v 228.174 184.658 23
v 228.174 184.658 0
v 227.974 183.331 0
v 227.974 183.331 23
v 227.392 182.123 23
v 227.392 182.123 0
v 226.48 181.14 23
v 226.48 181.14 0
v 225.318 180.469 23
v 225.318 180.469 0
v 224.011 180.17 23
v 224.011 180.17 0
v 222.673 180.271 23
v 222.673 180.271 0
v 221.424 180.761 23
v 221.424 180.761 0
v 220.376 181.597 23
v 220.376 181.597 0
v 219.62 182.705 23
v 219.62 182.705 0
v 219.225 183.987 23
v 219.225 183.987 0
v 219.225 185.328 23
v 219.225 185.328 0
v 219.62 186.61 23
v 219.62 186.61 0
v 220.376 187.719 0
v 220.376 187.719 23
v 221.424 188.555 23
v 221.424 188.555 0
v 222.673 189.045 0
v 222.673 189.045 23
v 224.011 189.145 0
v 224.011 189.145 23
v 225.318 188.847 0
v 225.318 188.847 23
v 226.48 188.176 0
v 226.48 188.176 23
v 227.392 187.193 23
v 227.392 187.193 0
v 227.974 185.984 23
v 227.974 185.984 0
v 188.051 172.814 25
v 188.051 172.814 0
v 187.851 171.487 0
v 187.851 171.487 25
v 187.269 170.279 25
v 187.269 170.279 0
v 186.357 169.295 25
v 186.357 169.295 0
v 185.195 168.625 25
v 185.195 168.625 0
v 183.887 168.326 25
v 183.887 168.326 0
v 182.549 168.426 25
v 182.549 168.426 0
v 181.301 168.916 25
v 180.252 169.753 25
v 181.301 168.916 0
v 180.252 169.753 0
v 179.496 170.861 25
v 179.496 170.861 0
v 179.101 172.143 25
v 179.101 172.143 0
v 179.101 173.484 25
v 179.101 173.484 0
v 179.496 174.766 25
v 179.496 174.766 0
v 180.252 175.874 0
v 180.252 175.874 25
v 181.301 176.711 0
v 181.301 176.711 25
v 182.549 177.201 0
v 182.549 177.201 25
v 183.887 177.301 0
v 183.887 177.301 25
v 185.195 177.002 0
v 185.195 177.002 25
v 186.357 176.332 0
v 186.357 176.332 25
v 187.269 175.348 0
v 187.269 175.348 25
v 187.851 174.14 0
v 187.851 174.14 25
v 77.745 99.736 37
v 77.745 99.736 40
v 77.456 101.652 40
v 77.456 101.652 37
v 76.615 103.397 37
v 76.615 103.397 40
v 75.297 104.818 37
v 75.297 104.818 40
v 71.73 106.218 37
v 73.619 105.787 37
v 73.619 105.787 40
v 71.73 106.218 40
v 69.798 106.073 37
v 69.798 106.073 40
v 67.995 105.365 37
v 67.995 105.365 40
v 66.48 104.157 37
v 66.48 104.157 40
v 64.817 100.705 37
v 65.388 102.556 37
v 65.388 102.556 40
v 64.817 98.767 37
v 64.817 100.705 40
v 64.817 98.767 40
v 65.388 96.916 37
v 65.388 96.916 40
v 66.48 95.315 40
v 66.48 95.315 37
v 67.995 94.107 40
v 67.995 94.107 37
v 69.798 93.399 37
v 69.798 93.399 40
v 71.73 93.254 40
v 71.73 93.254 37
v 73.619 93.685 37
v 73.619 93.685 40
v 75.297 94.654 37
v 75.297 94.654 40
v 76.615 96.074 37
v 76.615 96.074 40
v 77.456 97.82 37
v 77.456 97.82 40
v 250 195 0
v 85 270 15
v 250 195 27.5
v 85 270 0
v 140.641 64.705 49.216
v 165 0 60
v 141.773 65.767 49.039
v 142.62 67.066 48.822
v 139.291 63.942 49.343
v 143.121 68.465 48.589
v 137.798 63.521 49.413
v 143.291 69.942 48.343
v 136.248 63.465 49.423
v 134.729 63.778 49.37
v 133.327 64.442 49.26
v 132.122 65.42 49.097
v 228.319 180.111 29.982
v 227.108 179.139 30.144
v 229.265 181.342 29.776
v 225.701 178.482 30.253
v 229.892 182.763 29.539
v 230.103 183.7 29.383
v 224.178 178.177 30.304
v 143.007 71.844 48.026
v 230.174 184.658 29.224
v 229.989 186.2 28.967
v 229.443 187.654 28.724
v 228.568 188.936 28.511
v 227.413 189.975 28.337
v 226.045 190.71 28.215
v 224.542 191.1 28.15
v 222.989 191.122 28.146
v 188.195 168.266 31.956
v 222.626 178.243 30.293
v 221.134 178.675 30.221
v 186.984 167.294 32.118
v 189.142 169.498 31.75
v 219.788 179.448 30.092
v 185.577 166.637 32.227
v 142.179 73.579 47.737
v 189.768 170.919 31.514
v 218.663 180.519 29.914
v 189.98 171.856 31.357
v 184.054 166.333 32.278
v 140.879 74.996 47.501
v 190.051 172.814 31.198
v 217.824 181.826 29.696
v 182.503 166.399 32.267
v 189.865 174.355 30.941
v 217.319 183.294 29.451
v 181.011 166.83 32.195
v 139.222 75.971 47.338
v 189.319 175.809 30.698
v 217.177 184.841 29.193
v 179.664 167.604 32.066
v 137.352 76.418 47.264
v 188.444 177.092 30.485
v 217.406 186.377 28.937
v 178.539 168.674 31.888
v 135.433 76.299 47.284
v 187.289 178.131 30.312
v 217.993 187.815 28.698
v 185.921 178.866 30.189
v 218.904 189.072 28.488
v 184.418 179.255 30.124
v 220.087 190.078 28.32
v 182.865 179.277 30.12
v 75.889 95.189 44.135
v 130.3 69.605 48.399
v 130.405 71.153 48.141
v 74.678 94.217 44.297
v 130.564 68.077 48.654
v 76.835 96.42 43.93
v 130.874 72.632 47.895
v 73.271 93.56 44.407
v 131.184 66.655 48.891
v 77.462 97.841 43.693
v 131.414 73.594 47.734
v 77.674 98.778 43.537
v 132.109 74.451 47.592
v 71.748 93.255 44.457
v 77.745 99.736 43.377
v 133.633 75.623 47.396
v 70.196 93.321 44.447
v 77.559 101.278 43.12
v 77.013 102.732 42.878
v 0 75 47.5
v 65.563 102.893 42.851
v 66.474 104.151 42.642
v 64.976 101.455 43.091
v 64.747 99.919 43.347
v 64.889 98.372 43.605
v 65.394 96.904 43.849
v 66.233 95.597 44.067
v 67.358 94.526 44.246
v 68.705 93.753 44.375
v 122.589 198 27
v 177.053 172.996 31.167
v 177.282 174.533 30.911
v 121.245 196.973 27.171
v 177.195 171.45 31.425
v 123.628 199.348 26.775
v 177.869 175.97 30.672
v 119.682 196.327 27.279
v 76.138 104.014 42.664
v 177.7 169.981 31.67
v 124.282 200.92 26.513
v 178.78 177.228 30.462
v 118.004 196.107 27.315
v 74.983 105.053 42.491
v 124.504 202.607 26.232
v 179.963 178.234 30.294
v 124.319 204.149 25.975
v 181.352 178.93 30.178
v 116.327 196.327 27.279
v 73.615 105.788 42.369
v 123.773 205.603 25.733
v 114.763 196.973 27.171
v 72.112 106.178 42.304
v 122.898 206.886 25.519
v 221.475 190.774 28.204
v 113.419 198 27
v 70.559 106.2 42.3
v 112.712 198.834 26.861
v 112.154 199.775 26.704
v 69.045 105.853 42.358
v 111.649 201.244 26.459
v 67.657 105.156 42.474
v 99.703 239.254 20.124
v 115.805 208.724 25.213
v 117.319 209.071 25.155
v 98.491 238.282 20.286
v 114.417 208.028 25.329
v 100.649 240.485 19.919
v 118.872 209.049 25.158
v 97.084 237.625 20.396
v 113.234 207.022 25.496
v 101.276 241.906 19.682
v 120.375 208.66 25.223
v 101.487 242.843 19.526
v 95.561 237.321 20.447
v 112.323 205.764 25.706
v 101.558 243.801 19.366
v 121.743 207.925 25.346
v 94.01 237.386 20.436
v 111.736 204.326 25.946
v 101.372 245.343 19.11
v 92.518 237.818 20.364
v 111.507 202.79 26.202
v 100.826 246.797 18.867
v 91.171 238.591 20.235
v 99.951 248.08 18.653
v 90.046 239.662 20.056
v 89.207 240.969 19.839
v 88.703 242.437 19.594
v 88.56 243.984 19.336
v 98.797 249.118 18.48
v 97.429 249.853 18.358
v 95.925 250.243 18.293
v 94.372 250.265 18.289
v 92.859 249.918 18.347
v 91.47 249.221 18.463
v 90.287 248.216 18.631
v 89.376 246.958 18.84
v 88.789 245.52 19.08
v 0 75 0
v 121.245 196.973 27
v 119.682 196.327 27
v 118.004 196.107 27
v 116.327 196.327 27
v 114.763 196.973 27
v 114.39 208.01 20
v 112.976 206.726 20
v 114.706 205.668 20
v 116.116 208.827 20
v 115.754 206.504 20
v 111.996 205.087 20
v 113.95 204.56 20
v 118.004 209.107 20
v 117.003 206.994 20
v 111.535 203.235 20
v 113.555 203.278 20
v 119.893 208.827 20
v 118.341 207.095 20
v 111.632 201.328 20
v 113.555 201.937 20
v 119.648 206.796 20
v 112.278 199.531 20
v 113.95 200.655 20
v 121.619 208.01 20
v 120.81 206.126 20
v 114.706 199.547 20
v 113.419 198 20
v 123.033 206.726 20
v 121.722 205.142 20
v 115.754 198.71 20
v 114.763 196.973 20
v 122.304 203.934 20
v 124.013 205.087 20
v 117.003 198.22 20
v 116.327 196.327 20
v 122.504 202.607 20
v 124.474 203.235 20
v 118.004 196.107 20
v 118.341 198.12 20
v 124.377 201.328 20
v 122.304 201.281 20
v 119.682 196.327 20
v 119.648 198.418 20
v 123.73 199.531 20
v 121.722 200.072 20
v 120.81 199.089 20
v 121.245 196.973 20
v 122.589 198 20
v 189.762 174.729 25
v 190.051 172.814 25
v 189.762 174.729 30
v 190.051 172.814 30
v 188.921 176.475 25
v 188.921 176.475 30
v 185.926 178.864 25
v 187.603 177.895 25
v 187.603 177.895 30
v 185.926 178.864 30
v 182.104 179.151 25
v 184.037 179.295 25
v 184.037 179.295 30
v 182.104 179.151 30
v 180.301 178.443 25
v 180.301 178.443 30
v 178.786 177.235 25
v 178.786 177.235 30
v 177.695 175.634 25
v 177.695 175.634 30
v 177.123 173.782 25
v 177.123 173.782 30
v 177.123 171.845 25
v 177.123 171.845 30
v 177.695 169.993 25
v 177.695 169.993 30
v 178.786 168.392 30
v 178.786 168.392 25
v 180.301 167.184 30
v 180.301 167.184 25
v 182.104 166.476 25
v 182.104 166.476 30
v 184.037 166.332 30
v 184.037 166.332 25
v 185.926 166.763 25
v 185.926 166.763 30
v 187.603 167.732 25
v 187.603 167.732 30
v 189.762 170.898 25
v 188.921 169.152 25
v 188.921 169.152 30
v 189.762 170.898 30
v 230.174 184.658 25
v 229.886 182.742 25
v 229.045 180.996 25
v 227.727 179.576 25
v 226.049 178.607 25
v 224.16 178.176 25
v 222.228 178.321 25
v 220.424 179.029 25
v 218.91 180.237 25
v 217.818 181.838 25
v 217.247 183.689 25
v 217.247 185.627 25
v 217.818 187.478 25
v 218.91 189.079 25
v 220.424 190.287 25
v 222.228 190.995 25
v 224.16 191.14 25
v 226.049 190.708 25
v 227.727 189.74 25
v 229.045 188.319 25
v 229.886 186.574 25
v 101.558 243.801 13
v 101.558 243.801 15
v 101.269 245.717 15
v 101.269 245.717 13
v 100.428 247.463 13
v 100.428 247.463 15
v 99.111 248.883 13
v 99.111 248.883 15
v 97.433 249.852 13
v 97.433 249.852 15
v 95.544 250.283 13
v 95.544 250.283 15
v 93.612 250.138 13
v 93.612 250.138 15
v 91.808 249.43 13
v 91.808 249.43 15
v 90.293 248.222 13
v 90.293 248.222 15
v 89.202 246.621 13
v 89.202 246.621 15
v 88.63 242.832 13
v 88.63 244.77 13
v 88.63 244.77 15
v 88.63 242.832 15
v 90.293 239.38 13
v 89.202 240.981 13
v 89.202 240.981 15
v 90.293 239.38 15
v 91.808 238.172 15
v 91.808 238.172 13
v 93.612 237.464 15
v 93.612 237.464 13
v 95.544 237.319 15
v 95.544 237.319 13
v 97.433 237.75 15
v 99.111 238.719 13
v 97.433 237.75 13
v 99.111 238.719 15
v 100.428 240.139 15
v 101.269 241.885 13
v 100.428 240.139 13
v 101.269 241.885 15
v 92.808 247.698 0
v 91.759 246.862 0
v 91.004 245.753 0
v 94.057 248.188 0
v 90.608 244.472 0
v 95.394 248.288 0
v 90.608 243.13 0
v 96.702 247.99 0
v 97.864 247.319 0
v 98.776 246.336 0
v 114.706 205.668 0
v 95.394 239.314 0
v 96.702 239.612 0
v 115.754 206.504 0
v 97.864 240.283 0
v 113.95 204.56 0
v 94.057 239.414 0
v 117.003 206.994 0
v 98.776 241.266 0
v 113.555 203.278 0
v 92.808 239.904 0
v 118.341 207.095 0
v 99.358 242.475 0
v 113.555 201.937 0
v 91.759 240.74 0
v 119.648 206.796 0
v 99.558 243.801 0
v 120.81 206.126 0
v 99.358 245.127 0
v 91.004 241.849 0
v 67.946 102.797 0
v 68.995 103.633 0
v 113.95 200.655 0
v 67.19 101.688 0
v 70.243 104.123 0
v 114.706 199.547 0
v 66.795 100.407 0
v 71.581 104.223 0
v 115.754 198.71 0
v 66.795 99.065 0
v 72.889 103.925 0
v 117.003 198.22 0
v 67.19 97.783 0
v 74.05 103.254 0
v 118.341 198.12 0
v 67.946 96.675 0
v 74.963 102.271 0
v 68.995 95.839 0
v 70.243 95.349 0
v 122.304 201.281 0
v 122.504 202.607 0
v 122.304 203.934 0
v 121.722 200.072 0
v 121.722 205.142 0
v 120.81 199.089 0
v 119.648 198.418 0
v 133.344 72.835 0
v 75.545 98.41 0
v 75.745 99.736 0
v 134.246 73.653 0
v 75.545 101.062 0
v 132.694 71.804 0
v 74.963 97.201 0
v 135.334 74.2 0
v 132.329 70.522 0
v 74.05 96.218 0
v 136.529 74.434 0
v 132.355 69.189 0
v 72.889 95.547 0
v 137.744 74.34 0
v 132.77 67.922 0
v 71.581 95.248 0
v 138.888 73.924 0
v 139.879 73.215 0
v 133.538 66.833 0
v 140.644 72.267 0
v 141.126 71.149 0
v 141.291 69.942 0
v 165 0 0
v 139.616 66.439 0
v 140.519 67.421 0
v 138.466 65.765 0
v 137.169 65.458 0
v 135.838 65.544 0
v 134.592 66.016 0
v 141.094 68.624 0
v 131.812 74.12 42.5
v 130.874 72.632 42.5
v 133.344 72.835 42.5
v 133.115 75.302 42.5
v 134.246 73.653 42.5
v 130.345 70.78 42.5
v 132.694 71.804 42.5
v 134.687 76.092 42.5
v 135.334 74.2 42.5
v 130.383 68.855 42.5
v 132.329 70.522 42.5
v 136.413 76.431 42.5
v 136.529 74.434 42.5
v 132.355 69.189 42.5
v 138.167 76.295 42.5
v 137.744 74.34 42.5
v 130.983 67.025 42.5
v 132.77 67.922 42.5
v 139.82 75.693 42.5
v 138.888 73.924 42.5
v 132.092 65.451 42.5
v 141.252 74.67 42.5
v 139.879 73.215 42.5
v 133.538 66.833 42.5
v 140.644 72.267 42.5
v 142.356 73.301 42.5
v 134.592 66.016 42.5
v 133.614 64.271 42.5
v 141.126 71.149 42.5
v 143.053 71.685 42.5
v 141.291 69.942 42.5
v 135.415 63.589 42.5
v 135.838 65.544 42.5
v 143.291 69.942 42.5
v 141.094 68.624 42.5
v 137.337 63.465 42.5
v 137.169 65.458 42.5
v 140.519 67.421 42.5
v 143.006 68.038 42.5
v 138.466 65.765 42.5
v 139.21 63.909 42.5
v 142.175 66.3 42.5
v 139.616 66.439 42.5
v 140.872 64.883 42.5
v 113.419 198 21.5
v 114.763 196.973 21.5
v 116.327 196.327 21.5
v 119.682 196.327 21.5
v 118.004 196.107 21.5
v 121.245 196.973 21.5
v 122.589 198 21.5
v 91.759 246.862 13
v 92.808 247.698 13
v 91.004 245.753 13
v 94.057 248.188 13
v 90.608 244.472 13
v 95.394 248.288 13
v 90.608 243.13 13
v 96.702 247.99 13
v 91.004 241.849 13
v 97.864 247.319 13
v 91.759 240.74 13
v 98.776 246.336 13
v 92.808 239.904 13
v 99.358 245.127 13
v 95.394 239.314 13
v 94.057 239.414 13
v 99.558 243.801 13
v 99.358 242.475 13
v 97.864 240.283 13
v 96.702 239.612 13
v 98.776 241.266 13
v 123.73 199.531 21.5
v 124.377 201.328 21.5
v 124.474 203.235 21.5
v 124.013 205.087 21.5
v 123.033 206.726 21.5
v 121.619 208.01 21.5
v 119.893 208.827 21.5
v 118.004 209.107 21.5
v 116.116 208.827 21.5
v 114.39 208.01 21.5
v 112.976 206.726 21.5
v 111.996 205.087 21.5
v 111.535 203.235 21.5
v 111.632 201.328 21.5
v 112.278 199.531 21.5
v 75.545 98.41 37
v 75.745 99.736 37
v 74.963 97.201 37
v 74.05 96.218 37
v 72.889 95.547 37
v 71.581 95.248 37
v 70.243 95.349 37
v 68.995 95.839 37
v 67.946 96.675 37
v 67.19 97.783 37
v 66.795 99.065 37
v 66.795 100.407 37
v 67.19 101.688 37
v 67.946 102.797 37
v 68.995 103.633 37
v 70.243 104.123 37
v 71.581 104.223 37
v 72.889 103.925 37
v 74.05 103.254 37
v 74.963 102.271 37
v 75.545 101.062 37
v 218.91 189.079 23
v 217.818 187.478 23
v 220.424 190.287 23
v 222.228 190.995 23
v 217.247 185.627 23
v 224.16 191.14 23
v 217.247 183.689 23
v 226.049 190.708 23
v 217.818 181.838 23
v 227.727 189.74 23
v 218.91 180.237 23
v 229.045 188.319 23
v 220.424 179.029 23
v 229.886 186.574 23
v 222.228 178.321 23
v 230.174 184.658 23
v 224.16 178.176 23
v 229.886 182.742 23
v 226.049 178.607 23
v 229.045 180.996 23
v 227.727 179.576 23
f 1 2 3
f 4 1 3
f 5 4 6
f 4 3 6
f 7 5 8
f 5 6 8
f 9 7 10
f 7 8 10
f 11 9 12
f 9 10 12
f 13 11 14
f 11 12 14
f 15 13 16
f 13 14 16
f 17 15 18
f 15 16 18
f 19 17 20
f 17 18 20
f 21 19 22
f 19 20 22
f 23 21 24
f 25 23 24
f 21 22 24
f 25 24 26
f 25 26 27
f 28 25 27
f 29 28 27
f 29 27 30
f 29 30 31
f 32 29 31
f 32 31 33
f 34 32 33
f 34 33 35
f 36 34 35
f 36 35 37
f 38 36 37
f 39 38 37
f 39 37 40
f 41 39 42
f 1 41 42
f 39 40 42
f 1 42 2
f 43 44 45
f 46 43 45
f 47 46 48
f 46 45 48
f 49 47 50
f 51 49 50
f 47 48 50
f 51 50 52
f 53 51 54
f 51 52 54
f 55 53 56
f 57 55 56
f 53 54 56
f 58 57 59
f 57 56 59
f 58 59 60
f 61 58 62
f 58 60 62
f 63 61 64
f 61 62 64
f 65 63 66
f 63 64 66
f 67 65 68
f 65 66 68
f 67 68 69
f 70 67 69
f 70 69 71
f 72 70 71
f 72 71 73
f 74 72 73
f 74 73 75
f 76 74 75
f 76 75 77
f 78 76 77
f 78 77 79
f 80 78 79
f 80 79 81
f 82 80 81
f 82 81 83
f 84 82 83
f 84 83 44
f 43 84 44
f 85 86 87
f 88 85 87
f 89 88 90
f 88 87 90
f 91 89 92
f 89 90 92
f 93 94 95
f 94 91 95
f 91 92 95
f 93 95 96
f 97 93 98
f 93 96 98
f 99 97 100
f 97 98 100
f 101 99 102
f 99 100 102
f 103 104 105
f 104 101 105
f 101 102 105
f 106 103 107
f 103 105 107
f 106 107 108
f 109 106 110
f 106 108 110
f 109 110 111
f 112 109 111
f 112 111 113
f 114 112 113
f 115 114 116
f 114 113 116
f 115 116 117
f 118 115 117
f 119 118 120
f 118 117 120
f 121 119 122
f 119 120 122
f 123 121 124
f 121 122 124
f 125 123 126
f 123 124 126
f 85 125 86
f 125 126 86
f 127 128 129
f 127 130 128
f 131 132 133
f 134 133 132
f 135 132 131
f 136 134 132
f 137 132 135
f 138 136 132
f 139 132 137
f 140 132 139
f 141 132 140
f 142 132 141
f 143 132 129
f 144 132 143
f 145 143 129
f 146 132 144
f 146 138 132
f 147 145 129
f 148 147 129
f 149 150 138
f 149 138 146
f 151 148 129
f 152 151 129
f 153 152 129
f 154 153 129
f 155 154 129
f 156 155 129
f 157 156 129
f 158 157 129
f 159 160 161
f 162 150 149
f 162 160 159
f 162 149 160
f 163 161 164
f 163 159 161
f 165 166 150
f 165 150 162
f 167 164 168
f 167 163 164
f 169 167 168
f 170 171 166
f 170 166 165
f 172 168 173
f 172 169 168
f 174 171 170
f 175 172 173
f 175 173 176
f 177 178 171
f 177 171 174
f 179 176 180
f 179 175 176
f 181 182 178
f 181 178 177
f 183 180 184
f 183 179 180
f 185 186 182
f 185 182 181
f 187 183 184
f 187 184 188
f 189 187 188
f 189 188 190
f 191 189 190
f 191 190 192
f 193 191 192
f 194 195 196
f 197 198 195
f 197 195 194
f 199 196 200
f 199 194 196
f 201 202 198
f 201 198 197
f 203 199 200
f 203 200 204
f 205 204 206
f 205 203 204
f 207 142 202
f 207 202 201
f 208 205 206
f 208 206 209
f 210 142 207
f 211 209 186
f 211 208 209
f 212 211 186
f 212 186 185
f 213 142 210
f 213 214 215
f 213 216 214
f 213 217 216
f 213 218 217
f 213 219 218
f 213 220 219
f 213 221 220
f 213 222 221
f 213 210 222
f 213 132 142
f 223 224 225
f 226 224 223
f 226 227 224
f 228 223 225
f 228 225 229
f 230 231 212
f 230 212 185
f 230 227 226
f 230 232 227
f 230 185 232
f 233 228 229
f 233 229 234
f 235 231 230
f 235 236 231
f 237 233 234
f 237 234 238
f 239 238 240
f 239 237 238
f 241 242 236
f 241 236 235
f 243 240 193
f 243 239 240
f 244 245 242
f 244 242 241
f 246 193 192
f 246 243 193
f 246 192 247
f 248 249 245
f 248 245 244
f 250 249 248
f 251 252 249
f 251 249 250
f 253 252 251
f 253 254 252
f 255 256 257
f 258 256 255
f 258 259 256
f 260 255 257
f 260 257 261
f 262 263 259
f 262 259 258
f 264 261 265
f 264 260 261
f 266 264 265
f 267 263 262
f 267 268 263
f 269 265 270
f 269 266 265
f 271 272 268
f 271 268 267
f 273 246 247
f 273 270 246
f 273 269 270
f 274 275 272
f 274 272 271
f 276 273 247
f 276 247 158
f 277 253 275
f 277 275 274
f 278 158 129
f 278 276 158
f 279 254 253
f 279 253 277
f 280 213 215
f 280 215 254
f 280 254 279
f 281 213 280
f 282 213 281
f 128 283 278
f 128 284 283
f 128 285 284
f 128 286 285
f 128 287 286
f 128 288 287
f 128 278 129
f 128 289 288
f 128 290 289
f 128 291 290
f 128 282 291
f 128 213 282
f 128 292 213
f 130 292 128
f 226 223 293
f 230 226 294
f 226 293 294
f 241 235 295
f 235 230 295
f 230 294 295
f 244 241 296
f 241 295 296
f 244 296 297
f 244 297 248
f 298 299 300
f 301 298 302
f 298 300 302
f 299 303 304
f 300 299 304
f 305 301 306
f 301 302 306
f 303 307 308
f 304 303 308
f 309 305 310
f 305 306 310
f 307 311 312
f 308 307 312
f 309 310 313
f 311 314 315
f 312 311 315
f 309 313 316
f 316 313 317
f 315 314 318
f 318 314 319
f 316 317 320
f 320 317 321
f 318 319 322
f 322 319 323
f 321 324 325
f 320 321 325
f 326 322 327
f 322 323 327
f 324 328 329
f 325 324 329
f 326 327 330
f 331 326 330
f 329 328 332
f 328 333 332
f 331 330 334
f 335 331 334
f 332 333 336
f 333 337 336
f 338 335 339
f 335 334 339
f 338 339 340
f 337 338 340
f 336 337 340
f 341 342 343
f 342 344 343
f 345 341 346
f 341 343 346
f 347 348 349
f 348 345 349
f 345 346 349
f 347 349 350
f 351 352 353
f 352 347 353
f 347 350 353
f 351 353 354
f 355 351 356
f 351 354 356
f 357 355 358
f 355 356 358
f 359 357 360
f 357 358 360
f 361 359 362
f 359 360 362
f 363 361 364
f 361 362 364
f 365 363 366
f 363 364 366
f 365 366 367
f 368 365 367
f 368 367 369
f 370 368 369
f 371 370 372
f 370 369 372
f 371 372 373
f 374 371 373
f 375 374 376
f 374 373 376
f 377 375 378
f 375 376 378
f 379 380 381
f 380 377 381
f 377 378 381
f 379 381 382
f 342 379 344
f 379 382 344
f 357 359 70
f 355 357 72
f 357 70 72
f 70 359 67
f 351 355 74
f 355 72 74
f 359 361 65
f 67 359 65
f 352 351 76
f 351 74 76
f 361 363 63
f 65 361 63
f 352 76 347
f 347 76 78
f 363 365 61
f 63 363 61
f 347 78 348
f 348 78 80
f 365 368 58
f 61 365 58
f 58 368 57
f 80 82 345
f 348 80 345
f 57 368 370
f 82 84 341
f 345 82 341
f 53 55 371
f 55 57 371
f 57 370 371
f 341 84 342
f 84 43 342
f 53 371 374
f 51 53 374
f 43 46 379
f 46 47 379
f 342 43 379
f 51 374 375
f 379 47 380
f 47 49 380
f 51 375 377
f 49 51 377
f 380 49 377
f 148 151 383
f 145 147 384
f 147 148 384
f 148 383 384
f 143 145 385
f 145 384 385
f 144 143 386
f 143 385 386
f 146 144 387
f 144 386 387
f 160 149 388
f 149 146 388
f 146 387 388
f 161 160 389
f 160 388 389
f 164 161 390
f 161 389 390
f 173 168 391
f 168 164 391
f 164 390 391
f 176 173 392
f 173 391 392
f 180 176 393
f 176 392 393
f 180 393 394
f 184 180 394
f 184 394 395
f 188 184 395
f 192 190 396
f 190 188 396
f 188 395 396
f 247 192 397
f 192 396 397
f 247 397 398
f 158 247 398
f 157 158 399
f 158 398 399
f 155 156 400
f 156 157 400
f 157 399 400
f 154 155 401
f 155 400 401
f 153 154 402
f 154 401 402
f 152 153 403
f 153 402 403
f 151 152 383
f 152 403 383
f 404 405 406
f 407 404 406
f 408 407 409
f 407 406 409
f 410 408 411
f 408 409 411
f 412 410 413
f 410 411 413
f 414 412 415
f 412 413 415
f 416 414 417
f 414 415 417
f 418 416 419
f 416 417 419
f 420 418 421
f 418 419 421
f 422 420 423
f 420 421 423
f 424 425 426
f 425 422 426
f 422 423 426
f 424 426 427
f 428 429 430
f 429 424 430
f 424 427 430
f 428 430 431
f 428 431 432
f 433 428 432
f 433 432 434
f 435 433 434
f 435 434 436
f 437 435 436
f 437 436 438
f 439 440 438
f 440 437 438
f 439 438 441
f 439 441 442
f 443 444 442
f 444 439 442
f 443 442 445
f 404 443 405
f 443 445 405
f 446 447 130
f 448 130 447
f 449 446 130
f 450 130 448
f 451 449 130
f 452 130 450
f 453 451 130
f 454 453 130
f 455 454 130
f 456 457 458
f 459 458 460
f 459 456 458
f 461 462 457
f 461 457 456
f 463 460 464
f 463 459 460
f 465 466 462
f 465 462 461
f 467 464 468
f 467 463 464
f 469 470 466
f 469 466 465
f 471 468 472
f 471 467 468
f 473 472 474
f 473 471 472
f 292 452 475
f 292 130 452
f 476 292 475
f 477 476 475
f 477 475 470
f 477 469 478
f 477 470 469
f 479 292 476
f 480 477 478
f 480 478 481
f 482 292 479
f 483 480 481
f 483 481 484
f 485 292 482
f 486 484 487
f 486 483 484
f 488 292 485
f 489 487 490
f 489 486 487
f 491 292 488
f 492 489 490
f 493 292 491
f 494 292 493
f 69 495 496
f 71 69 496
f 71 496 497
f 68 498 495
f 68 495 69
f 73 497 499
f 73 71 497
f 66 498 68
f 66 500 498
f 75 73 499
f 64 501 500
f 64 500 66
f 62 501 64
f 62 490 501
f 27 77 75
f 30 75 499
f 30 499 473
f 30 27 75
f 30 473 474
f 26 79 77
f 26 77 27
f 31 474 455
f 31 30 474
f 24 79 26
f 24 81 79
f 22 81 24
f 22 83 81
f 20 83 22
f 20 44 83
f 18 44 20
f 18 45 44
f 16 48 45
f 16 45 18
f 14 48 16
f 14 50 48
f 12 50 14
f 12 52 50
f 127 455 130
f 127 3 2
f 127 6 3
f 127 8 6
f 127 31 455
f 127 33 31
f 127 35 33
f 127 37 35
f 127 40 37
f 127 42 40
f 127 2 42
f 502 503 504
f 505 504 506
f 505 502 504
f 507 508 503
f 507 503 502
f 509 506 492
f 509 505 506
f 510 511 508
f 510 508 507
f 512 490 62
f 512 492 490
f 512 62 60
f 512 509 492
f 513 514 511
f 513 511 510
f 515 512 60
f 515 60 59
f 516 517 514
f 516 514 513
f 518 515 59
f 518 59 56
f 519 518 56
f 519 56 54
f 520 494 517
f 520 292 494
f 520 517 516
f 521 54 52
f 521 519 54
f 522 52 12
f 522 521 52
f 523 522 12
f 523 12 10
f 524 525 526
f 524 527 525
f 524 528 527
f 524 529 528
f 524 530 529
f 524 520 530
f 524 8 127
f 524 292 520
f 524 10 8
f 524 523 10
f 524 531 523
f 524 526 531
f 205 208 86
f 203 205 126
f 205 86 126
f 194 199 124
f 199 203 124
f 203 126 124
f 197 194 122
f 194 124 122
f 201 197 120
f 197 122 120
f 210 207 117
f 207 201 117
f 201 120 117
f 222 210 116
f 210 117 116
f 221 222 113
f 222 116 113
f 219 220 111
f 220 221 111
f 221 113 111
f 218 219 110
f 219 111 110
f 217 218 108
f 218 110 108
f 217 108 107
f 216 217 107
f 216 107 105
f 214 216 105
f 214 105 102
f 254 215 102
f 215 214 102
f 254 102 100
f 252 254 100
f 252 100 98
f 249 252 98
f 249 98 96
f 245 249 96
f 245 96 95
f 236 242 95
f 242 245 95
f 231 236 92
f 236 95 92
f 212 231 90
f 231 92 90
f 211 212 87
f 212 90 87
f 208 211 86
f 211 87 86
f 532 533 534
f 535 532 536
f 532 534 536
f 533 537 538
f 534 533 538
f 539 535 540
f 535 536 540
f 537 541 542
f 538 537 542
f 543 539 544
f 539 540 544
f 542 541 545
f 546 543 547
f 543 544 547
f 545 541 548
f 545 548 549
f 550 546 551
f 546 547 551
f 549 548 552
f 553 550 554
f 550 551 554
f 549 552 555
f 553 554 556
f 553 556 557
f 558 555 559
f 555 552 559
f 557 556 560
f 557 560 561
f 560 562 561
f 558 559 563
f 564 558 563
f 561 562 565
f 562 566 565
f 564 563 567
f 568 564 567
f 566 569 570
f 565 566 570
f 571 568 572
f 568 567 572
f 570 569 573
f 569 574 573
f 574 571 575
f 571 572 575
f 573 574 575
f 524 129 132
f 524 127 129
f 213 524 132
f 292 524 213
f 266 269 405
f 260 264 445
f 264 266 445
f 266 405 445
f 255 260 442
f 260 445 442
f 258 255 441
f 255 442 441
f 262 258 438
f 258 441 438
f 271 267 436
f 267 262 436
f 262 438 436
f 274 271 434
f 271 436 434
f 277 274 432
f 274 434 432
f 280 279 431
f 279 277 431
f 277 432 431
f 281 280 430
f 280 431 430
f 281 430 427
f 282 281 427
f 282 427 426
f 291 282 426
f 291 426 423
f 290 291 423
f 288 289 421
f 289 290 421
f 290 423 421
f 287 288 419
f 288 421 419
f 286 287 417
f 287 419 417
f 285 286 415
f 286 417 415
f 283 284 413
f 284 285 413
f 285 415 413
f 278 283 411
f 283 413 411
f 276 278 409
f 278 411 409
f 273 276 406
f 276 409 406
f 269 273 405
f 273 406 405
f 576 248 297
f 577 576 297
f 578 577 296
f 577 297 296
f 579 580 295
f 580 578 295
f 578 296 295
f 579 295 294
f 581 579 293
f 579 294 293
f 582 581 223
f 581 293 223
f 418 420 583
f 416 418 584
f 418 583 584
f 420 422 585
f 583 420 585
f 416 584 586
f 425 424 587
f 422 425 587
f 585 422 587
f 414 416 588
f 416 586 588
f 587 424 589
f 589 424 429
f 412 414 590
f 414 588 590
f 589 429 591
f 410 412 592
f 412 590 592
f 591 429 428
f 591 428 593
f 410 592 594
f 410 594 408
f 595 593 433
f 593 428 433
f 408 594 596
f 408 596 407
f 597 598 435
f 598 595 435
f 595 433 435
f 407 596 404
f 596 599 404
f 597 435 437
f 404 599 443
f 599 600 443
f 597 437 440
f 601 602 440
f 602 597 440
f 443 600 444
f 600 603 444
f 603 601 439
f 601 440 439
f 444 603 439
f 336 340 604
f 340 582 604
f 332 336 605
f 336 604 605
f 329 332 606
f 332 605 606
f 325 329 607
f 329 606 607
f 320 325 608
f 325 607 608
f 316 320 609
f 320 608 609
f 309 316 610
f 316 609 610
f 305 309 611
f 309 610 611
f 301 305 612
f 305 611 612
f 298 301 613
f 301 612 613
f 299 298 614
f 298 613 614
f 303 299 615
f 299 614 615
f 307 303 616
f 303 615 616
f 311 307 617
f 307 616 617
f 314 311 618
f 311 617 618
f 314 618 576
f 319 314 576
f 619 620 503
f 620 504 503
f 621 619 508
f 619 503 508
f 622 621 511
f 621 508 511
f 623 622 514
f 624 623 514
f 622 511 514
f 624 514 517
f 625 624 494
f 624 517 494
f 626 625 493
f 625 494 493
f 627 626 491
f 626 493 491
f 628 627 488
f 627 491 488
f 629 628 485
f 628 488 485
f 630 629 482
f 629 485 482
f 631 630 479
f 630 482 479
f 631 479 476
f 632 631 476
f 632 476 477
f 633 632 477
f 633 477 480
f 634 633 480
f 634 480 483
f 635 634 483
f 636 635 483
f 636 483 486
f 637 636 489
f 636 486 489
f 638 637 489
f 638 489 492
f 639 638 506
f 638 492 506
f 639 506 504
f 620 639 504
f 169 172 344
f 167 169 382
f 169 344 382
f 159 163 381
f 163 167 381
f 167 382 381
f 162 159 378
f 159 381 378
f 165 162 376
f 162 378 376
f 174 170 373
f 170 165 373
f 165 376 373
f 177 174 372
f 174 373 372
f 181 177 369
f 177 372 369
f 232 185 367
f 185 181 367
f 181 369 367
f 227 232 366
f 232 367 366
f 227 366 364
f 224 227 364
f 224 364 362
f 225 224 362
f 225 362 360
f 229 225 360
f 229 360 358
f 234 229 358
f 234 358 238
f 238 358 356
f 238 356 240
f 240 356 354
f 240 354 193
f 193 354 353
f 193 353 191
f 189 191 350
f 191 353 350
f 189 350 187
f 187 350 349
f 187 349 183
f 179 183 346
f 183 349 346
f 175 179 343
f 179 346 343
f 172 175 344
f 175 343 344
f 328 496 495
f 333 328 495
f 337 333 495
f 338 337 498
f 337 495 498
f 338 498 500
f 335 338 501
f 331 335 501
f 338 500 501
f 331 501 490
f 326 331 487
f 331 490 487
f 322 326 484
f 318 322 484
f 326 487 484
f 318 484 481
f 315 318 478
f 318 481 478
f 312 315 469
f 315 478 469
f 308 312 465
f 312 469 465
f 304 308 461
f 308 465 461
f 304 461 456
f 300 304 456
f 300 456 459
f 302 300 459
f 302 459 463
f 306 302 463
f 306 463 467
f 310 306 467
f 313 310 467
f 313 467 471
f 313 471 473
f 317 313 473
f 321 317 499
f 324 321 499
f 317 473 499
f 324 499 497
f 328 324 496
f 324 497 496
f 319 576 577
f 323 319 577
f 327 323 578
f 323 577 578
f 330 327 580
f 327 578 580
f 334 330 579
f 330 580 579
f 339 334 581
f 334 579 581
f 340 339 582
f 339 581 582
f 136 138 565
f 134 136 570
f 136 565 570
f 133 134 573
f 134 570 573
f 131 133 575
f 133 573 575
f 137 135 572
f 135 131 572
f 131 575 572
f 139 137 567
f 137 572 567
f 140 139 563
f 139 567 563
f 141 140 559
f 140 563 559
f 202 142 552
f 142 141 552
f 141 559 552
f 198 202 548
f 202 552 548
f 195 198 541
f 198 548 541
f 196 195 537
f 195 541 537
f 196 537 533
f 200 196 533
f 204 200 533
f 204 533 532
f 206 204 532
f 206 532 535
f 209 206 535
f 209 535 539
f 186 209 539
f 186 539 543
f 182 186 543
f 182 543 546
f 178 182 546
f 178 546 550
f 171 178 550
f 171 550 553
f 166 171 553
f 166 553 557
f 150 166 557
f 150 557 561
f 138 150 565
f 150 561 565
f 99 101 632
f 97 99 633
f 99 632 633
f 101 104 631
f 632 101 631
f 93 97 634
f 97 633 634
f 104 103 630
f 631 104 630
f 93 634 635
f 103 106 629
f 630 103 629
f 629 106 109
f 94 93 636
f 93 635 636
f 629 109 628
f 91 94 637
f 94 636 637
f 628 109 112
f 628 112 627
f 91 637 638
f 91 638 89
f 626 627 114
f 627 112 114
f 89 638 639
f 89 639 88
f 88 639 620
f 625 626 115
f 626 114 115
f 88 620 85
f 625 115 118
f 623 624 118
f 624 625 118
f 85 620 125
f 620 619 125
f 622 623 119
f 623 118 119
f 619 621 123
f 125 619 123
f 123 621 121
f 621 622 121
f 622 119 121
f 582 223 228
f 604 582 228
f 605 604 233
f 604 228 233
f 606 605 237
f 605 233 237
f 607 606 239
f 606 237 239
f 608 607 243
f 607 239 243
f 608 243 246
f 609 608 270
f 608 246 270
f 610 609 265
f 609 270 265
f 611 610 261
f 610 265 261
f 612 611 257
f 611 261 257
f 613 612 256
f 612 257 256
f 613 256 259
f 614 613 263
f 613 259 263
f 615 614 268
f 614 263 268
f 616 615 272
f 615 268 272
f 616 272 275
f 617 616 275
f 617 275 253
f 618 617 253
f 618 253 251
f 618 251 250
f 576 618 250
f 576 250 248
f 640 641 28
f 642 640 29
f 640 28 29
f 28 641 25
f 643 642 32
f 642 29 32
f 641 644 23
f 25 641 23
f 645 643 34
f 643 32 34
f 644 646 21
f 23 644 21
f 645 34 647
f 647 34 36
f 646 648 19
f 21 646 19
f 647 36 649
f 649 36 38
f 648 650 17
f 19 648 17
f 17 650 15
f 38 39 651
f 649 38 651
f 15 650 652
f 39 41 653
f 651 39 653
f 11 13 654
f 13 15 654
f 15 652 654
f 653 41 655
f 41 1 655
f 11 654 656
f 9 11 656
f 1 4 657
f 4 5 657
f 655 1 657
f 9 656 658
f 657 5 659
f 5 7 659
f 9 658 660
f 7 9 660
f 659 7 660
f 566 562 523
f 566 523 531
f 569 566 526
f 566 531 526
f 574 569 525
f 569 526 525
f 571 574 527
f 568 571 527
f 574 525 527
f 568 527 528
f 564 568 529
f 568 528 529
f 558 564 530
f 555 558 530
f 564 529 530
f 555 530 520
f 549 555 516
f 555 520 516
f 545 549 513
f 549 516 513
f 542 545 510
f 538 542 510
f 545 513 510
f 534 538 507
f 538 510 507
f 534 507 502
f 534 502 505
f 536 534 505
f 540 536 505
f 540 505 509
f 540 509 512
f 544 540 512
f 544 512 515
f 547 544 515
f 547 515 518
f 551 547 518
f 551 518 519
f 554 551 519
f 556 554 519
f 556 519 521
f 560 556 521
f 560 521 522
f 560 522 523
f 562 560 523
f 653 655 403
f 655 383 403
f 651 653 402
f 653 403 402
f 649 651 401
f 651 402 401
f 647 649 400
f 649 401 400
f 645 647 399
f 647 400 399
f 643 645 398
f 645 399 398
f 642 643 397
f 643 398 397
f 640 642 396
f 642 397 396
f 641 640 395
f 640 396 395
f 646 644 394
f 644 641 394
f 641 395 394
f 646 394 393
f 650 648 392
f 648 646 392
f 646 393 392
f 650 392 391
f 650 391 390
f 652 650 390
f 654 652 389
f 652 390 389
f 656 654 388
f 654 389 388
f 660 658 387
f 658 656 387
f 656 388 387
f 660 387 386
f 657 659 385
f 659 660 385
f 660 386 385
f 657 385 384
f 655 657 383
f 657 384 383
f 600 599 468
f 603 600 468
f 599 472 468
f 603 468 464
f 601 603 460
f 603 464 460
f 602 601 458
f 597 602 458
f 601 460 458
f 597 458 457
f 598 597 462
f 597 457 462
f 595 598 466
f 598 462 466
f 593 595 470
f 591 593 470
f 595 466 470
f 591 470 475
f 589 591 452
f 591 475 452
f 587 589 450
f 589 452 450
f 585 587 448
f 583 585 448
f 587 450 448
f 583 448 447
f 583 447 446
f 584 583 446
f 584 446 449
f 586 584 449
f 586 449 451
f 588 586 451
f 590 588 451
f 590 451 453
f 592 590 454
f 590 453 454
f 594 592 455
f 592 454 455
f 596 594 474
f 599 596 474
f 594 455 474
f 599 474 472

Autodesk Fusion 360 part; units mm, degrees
sketch "Sketch1" plane through (0, 0, 0) normal (1, 0, 0) x (0, 1, 0)
  line L0 (0, 0) -> (0, 60)
  line L1 (0, 0) -> (270, 0)
  line L2 (270, 0) -> (270, 15)
  line L3 (0, 60) -> (270, 15)
  dimension "d1" = 60
  dimension "d2" = 270
  dimension "d3" = 15
extrude "Extrude1" add sketch "Sketch1" along normal blind 250
sketch "Sketch2" plane through (0, 0, 0) normal (0, 0, -1) x (1, 0, 0)
  line L0 (0, 0) -> (0, -270)
  line L1 (0, -270) -> (250, -270)
  line L2 (250, -270) -> (250, 0)
  line L3 (250, 0) -> (0, 0)
  line L4 (250, -270) -> (250, -195)
  line L5 (250, 0) -> (165, 0)
  line L6 (0, 0) -> (0, -75)
  line L7 (250, -195) -> (165, 0)
  line L8 (165, 0) -> (0, -75)
  line L9 (0, -270) -> (85, -270)
  line L10 (0, -75) -> (85, -270)
  line L11 (85, -270) -> (250, -195)
  line L12 (0, -270) -> (250, -270)
  line L13 (250, -270) -> (250, 0)
  line L14 (250, 0) -> (0, 0)
  line L15 (0, 0) -> (0, -270)
  line L16 (250, -195) -> (231.6661, -202.9917)
  line L17 (250, -195) -> (242.0083, -176.6661)
  circle A0 centre (223.6744, -184.6578) radius 4.5
  line L18 (85, -270) -> (76.7239, -251.7927)
  line L19 (85, -270) -> (103.2073, -261.7239)
  circle A1 centre (95.0579, -243.801) radius 4.5
  line L20 (0, -75) -> (82.5001, -37.4999)
  line L21 (104.0179, -84.839) -> (136.7911, -69.9421)
  circle A2 centre (71.2447, -99.7359) radius 4.5
  circle A3 centre (136.7911, -69.9421) radius 4.5
  circle A4 centre (118.0044, -202.6073) radius 4.5
  circle A5 centre (183.5508, -172.8135) radius 4.5
  circle A6 centre (95.0579, -243.801) radius 6.5
  circle A7 centre (223.6744, -184.6578) radius 6.5
  circle A8 centre (71.2447, -99.7359) radius 6.5
  circle A9 centre (136.7911, -69.9421) radius 6.5
  circle A10 centre (118.0044, -202.6073) radius 6.5
  circle A11 centre (183.5508, -172.8135) radius 6.5
  dimension "d6" = 75
  dimension "d7" = 85
  dimension "d8" = 75
  dimension "d9" = 85
  dimension "d12" = 20
  dimension "d13" = 20
  dimension "d15" = 9
  dimension "d16" = 20
  dimension "d17" = 20
  dimension "d19" = 9
  dimension "d21" = 90.623
  dimension "d22" = 52
  dimension "d23" = 36
  dimension "d24" = 36
  dimension "d25" = 9
  dimension "d26" = 9
  dimension "d27" = 113
  dimension "d28" = 113
  dimension "d29" = 9
  dimension "d30" = 9
  dimension "d33" = 13
  dimension "d34" = 13
  dimension "d35" = 13
  dimension "d36" = 13
  dimension "d37" = 13
  dimension "d38" = 13
extrude "Extrude2" cut sketch "Sketch2" against normal blind 100 contours L0 L3 L6 L8 L14 L15 L20 | L0 L1 L9 L10 L12 L15 | L2 L3 L5 L7 L13 L14 L17 | L1 L2 L4 L11 L12 L13 L19
extrude "Extrude3" cut sketch "Sketch2" against normal blind 100 contours A0 | A1 | A3 | A2 | A4 | A5
extrude "Extrude4" cut sketch "Sketch2" against normal blind 100 contours A9 | A6 | A7 | A8 | A10 | A11
extrude "Extrude5" add sketch "Sketch2" against normal blind 25 contours A7
extrude "Extrude6" cut 1 faces at (219.6356, 180.4699, 25) along direction (0, 0, -1) blind 2
extrude "Extrude7" add sketch "Sketch2" against normal blind 30 contours A11
extrude "Extrude8" cut 1 faces at (188.9248, 175.043, 30) along direction (0, 0, -1) blind 5
extrude "Extrude9" add sketch "Sketch2" against normal blind 27 contours A10
extrude "Extrude10" cut 1 faces at (117.5741, 208.413, 27) along direction (0, 0, -1) blind 5.5
extrude "Extrude11" cut 1 faces at (117.5741, 208.413, 21.5) along direction (0, 0, -1) blind 1.5
extrude "Extrude12" add sketch "Sketch2" against normal blind 15 contours A6
extrude "Extrude13" cut 1 faces at (99.5359, 247.5155, 15) along direction (0, 0, -1) blind 2
extrude "Extrude14" add sketch "Sketch2" against normal blind 40 contours A9 | A8
extrude "Extrude15" cut 1 faces at (77.0371, 100.2824, 40) along direction (0, 0, -1) blind 3
extrude "Extrude16" add 1 faces at (142.5835, 70.4886, 40) along direction (0, 0, 1) blind 2.5
